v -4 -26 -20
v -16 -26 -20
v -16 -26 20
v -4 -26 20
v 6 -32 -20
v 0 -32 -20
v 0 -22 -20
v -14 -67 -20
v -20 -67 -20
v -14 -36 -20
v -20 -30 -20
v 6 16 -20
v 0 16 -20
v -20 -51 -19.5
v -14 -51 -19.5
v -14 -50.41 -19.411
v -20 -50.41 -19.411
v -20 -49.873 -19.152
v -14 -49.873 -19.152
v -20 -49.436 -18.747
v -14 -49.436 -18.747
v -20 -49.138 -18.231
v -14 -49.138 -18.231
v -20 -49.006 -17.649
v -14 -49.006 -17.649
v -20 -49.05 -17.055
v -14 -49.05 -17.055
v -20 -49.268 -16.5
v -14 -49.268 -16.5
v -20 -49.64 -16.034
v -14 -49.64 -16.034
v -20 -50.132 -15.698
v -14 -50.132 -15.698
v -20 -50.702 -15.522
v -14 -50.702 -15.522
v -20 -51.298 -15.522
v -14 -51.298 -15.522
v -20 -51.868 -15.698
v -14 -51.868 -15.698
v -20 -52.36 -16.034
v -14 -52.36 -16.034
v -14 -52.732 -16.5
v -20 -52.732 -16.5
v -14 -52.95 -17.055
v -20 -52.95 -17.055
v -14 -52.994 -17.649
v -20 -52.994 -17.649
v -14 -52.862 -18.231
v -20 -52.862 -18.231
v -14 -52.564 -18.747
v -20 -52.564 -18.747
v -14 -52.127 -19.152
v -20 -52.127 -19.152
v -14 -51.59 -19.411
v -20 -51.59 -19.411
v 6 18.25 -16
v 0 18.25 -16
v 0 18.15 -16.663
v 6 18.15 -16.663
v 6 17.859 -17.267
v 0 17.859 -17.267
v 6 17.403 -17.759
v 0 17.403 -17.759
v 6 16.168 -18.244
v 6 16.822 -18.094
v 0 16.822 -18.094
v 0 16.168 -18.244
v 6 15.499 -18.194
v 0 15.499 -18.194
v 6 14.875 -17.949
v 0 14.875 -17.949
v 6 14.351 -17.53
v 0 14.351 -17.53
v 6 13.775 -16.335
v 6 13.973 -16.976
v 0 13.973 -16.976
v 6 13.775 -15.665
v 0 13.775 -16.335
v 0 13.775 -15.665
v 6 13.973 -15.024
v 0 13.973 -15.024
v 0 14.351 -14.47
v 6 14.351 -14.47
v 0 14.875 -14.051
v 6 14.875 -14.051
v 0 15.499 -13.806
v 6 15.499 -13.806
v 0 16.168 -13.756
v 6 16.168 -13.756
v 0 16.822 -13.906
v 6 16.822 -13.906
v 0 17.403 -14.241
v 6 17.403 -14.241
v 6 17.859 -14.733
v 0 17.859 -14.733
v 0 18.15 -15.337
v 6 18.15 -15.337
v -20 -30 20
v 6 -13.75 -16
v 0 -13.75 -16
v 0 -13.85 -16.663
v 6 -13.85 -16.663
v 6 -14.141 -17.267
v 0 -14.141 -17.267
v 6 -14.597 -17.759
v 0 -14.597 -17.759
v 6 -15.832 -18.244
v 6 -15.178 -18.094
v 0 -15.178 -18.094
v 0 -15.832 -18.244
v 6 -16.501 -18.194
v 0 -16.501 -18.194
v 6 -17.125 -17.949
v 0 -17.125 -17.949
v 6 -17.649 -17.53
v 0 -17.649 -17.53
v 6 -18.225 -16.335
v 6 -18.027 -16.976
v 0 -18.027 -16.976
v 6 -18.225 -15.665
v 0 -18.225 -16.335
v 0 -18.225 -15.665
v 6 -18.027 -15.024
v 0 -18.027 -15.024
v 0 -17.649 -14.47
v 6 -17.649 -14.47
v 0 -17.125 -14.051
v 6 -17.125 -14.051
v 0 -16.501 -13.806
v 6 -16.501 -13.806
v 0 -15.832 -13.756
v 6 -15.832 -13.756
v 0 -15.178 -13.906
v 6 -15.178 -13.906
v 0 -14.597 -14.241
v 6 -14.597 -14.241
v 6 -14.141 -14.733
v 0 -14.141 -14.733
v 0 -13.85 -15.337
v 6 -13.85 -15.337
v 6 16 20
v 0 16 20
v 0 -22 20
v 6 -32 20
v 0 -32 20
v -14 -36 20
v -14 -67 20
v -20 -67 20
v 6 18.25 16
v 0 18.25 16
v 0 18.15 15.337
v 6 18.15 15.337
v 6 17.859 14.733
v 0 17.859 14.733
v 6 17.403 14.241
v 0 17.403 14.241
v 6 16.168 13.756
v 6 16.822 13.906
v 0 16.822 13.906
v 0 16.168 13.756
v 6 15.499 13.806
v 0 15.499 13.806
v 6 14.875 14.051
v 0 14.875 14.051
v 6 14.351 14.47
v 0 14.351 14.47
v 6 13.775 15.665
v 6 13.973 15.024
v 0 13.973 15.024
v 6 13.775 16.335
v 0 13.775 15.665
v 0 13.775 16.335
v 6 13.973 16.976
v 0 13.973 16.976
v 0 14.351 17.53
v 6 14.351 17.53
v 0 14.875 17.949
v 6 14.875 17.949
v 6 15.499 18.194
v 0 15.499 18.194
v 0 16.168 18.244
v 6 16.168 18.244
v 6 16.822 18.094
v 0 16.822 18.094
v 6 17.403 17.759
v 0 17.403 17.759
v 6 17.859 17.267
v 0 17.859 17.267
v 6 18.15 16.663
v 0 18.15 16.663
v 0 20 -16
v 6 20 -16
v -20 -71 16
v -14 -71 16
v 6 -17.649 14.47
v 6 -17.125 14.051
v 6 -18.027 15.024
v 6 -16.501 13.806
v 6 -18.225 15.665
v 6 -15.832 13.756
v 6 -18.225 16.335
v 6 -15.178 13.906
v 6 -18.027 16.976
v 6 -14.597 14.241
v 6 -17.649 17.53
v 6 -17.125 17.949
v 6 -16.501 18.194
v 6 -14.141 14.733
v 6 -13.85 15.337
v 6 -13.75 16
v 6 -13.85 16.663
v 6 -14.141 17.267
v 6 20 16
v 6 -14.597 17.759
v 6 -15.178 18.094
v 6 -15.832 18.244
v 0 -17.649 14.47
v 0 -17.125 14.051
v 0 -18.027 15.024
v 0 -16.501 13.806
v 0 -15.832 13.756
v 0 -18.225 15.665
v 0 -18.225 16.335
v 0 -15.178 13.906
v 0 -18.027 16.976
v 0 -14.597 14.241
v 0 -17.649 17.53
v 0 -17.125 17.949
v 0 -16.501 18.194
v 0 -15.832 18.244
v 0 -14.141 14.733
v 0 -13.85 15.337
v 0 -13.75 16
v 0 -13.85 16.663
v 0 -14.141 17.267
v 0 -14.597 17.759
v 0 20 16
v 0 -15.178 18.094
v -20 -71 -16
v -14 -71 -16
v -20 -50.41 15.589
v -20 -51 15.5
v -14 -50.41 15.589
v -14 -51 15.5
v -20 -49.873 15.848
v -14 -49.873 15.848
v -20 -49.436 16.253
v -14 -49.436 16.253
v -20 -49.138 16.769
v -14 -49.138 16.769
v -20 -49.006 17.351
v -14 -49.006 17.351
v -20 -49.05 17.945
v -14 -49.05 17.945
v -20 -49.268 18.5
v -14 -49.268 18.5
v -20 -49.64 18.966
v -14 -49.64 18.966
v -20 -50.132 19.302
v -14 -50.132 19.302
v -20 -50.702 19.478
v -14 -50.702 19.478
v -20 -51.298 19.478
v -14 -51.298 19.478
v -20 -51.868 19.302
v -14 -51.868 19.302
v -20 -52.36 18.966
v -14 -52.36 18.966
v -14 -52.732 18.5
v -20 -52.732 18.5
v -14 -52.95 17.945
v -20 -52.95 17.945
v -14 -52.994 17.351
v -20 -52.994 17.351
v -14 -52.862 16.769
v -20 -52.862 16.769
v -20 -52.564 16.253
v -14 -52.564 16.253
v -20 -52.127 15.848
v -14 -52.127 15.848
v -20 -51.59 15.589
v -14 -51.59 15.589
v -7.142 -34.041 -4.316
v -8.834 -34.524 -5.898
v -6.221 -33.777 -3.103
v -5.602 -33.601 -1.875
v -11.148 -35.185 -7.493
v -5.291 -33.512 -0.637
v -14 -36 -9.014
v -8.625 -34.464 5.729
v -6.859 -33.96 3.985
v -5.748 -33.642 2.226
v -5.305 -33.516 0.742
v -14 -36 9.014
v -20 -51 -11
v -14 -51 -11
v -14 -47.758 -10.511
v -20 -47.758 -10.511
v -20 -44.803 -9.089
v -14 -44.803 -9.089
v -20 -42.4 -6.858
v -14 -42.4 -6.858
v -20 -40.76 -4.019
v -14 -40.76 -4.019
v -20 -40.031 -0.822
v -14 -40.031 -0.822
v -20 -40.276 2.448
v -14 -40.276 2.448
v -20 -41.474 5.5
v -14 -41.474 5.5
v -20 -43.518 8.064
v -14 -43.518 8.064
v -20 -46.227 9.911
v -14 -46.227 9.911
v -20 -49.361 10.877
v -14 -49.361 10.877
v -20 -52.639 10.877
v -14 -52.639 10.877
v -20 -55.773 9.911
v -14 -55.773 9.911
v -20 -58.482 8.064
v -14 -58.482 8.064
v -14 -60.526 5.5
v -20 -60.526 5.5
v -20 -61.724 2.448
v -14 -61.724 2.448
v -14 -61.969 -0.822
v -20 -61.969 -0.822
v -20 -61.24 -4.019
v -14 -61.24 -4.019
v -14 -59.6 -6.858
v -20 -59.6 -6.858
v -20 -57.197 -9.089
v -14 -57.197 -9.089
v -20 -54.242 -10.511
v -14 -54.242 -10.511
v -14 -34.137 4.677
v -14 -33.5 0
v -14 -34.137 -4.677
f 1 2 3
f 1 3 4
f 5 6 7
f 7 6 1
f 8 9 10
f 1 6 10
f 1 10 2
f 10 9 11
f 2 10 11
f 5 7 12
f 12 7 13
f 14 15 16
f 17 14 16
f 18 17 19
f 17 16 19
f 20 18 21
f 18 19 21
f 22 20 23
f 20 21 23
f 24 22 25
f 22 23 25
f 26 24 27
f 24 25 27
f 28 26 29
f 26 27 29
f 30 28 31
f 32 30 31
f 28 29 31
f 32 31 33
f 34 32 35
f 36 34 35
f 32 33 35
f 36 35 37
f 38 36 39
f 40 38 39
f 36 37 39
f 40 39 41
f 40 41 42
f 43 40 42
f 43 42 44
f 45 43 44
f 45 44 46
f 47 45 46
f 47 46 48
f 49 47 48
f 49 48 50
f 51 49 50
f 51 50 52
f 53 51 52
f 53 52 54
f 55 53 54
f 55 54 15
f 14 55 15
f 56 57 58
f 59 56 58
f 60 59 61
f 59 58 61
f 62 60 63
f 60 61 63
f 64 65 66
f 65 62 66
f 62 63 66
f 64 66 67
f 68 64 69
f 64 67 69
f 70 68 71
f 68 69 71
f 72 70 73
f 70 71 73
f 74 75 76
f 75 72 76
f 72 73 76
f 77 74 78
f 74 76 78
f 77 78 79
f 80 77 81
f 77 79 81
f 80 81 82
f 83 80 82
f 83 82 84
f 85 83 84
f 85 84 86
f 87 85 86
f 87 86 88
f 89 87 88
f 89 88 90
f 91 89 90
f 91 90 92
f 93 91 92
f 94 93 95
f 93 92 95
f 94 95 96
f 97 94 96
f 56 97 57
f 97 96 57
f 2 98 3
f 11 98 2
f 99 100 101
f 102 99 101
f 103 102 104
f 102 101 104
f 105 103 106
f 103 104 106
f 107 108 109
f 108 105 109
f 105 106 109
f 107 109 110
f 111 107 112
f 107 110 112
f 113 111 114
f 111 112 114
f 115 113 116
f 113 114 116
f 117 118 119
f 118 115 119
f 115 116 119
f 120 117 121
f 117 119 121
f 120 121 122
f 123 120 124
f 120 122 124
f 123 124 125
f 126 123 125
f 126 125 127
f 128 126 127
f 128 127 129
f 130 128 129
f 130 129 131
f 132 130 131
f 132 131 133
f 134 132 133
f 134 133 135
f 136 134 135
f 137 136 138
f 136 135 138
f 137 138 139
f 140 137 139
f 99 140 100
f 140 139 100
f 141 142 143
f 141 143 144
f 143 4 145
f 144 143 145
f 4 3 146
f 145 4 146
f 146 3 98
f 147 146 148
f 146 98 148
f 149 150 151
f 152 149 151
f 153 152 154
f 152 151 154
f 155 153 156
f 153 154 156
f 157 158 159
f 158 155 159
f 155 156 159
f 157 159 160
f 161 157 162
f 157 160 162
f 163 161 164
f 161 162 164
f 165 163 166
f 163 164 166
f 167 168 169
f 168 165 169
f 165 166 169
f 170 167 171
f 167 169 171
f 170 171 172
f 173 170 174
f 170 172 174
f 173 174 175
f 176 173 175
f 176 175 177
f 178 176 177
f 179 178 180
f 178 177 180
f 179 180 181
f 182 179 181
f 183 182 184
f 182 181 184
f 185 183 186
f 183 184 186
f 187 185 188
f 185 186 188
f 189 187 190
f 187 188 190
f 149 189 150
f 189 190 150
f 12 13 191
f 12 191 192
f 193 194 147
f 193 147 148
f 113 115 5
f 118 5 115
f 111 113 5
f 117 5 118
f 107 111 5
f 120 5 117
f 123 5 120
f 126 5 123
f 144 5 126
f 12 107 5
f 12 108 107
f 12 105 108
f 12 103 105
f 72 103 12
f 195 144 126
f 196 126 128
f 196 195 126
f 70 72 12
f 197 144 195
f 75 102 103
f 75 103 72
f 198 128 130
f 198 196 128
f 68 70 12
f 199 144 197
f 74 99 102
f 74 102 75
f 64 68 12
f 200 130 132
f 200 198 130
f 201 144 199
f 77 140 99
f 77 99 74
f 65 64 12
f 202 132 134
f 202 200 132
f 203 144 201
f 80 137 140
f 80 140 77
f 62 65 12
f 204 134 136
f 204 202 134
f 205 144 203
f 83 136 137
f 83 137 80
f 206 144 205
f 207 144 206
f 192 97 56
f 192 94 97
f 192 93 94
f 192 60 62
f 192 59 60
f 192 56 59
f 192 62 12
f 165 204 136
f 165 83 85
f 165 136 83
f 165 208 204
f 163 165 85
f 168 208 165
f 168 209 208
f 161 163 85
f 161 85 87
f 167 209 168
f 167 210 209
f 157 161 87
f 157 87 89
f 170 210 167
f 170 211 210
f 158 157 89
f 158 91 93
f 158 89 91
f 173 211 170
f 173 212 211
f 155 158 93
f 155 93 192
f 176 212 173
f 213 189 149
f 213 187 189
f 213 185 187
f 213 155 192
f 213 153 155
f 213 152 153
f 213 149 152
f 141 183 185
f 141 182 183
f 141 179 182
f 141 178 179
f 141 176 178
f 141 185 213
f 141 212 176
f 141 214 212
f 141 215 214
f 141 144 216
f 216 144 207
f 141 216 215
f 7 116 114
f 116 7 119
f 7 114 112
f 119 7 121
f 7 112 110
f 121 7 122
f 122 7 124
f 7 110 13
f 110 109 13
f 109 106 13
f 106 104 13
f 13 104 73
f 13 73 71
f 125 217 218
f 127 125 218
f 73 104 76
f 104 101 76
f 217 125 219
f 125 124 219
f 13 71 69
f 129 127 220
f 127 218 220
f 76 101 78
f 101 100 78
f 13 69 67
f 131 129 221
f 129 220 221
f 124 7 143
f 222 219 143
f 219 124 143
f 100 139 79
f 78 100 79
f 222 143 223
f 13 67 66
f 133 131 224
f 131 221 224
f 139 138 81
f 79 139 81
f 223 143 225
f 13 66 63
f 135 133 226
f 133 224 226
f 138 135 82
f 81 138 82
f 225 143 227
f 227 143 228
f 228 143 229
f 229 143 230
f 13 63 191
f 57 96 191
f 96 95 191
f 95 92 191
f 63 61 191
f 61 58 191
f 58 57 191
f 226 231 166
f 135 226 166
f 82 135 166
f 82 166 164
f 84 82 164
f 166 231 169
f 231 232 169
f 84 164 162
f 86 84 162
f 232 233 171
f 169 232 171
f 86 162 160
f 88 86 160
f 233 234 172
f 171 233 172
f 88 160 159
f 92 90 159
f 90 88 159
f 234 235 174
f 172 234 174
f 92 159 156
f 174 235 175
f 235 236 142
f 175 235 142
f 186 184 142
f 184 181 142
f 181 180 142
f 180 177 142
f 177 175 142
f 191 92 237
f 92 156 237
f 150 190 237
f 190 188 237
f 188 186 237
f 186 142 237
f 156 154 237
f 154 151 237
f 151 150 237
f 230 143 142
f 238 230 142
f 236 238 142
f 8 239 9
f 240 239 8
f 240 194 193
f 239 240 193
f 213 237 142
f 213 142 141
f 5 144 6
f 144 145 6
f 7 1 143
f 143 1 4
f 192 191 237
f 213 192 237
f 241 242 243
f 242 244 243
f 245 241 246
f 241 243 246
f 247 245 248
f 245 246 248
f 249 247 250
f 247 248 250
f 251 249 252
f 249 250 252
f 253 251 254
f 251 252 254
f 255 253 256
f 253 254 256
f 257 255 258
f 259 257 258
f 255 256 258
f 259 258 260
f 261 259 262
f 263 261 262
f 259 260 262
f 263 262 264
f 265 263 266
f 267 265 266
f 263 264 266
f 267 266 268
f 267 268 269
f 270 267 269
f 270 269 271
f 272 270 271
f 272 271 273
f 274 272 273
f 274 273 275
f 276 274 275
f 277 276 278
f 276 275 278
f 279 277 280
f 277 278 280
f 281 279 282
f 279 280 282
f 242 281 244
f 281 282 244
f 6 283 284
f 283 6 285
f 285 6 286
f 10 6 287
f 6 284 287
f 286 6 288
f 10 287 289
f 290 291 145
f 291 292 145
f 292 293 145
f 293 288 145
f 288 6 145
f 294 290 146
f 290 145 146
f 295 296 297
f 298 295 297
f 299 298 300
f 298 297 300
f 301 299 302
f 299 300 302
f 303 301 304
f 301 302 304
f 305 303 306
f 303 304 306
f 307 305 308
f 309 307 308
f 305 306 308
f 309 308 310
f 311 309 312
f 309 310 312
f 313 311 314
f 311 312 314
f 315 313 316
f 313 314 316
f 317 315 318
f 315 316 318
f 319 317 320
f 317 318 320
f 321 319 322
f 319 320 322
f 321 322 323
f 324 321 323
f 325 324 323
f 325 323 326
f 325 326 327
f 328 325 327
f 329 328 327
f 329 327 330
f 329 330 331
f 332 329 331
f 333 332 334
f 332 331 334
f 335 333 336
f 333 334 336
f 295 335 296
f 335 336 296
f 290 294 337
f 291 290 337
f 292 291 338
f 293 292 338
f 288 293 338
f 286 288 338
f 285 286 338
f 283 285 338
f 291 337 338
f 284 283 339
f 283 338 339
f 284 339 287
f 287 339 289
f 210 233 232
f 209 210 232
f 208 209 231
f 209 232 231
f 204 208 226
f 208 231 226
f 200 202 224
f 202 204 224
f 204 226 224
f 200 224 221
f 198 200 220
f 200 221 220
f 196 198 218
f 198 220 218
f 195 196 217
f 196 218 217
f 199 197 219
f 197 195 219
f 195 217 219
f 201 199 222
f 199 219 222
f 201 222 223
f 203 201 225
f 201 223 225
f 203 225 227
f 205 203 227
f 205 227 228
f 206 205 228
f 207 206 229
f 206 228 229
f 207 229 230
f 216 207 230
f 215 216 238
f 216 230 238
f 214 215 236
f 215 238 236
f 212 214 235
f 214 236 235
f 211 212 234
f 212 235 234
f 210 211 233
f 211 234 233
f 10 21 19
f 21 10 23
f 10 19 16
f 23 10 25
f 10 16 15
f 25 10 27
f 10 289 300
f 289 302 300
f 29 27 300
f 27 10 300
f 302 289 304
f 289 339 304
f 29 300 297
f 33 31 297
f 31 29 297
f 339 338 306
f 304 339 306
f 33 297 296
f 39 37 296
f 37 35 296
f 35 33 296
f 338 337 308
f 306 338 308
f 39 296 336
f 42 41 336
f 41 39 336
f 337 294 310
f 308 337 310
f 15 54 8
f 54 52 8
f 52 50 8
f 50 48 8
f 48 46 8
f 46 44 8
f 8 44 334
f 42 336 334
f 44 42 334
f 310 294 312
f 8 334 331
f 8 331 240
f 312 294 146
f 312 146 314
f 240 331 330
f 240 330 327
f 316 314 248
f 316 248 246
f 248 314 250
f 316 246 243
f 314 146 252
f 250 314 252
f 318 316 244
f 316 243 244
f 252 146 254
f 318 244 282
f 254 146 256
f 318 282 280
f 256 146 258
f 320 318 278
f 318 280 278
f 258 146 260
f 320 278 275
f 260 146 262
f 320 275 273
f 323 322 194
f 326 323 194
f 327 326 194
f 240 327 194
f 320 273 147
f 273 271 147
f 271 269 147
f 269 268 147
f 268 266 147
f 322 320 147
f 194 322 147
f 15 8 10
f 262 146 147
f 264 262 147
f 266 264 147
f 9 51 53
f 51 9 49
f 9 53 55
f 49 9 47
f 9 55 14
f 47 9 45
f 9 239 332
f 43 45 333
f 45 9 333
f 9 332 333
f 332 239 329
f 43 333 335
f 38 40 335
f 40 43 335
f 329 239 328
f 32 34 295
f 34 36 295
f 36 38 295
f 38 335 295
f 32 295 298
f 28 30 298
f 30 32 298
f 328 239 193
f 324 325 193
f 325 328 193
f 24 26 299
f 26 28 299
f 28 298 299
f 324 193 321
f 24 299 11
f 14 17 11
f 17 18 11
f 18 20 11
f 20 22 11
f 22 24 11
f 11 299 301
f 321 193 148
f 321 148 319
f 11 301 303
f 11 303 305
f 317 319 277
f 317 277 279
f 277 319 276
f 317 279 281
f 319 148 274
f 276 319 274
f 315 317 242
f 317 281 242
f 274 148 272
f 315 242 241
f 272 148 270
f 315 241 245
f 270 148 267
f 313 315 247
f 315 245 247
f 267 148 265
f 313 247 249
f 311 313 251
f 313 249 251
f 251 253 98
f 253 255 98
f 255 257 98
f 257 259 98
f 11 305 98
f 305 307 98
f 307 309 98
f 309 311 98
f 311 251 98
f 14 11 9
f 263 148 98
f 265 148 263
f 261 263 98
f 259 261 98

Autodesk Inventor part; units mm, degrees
ref_plane "YZ Plane" through (0, 0, 0) normal (1, 0, 0) x (0, 1, 0)
ref_plane "XZ Plane" through (0, 0, 0) normal (0, 1, 0) x (-1, 0, 0)
ref_plane "XY Plane" through (0, 0, 0) normal (0, 0, 1) x (1, 0, 0)
sketch "Skizze1" plane through (0, 0, 0) normal (1, 0, 0) x (0, 1, 0)
  line L0 (-20, -20) -> (20, -20)
  line L1 (20, -20) -> (20, 20)
  line L2 (20, 20) -> (-20, 20)
  line L3 (-20, 20) -> (-20, -20)
  line L4 (-20, -20) -> (20, 20) construction
  line L5 (20, -20) -> (-20, 20) construction
  line L6 (-16, -16) -> (16, -16) construction
  line L7 (16, -16) -> (16, 16) construction
  line L8 (16, 16) -> (-16, 16) construction
  line L9 (-16, 16) -> (-16, -16) construction
  line L10 (-16, -16) -> (16, 16) construction
  line L11 (16, -16) -> (-16, 16) construction
  circle A0 centre (16, 16) radius 2.25
  circle A1 centre (16, -16) radius 2.25
  circle A2 centre (-16, -16) radius 2.25
  circle A3 centre (-16, 16) radius 2.25
  line L12 (-20, 20) -> (-32, 20)
  line L13 (-32, 20) -> (-32, -20)
  line L14 (-32, -20) -> (-20, -20)
  line L15 (-20, -20) -> (-20, 20)
  point P0 (0, 0)
  dimension "d0" = 40
  dimension "d1" = 40
  dimension "d2" = 32
  dimension "d3" = 32
  dimension "d4" = 4.5
  dimension "d5" = 4.5
  dimension "d6" = 4.5
  dimension "d7" = 4.5
  dimension "d8" = 12
extrude "Extrusion1" add sketch "Skizze1" along normal blind 6
ref_plane "Arbeitsebene1" through (0, -32, 20) normal (0, 0, 1) x (1, 0, 0)
sketch "Skizze2" plane through (0, -32, 20) normal (0, 0, 1) x (1, 0, 0)
  line L0 (0, 52) -> (0, 0) projected
  line L1 (0, 0) -> (6, 0) projected
  line L2 (6, 52) -> (6, 0) projected
  line L3 (0, 52) -> (6, 52) projected
  line L4 (-20, 6) -> (-14, 6)
  line L5 (-14, 6) -> (-14, -39)
  line L6 (-14, -39) -> (-20, -39)
  line L7 (-20, -39) -> (-20, 6)
  line L8 (0, 0) -> (-14, -4)
  line L9 (-14, 6) -> (0, 6)
  point P0 (0, 32)
  point P1 (-17, -39)
  point P2 (-17, 6)
  dimension "d12" = 6
  dimension "d13" = 45
  dimension "d14" = 6
  dimension "d15" = 14
  dimension "d16" = 10
extrude "Extrusion2" add sketch "Skizze2" against normal up to surface (40 mm away) contours L0 L8 L5 L9 | L5 L6 L7 L4
chamfer "Fasen1" distance 4 angle 45 6 edges at (-20, -26, 0) (0, -26, 0) (-17, -71, -20) (-17, -71, 20) (3, 20, -20) (3, 20, 20)
sketch "Skizze3" plane through (-14, -36, 20) normal (1, 0, 0) x (0, 0, -1)
  line L0 (4, -35) -> (0, -31) projected
  line L1 (4, -35) -> (36, -35) projected
  line L2 (40, -31) -> (36, -35) projected
  line L3 (40, 0) -> (40, -31) projected
  line L4 (0, 0) -> (40, 0) projected
  line L5 (0, -31) -> (0, 0) projected
  circle A0 centre (20, -15) radius 20
  circle A1 centre (20, -15) radius 17.5
  point P0 (20, 36)
  dimension "d22" = 35
extrude "Extrusion3" cut sketch "Skizze3" along normal through all contours A1 L4 | L4 A1
sketch "Skizze4" plane through (-14, -67, 20) normal (1, 0, 0) x (0, 0, -1)
  line L0 (0, 31) -> (10.9861, 31) projected
  line L1 (0, 0) -> (0, 31) projected
  line L2 (4, -4) -> (0, 0) projected
  line L3 (4, -4) -> (36, -4) projected
  line L4 (40, 0) -> (36, -4) projected
  line L5 (40, 31) -> (40, 0) projected
  line L6 (29.0139, 31) -> (40, 31) projected
  arc A0 (29.0139, 31) -> (10.9861, 31) centre (20, 16) ccw projected
  circle A1 centre (20, 16) radius 17.5
  circle A2 centre (2.5, 16) radius 2
  circle A3 centre (37.5, 16) radius 2
  point P0 (20, 67)
  dimension "d25" = 4
  dimension "d26" = 4
extrude "Extrusion4" cut sketch "Skizze4" against normal blind 10 contours A2 A1 | A1 A2 | A3 A1 | A1 A3
sketch "Skizze5" plane through (-14, -67, 20) normal (1, 0, 0) x (0, 0, -1)
  arc A0 (29.0139, 31) -> (10.9861, 31) centre (20, 16) ccw projected
  line L0 (0, 35) -> (40, 35) projected
  line L1 (0, 31) -> (0, 35) projected
  line L2 (0, 31) -> (10.9861, 31) projected
  circle A1 centre (20, 16) radius 11
  line L3 (29.0139, 31) -> (40, 31) projected
  line L4 (40, 35) -> (40, 31) projected
  point P0 (20, 67)
  dimension "d29" = 22
extrude "Extrusion5" cut sketch "Skizze5" against normal blind 10 contours A1
properties part number "40_XYZstage_micrometer_motorized_nema8_samplemount_lightsheet_screwed"
